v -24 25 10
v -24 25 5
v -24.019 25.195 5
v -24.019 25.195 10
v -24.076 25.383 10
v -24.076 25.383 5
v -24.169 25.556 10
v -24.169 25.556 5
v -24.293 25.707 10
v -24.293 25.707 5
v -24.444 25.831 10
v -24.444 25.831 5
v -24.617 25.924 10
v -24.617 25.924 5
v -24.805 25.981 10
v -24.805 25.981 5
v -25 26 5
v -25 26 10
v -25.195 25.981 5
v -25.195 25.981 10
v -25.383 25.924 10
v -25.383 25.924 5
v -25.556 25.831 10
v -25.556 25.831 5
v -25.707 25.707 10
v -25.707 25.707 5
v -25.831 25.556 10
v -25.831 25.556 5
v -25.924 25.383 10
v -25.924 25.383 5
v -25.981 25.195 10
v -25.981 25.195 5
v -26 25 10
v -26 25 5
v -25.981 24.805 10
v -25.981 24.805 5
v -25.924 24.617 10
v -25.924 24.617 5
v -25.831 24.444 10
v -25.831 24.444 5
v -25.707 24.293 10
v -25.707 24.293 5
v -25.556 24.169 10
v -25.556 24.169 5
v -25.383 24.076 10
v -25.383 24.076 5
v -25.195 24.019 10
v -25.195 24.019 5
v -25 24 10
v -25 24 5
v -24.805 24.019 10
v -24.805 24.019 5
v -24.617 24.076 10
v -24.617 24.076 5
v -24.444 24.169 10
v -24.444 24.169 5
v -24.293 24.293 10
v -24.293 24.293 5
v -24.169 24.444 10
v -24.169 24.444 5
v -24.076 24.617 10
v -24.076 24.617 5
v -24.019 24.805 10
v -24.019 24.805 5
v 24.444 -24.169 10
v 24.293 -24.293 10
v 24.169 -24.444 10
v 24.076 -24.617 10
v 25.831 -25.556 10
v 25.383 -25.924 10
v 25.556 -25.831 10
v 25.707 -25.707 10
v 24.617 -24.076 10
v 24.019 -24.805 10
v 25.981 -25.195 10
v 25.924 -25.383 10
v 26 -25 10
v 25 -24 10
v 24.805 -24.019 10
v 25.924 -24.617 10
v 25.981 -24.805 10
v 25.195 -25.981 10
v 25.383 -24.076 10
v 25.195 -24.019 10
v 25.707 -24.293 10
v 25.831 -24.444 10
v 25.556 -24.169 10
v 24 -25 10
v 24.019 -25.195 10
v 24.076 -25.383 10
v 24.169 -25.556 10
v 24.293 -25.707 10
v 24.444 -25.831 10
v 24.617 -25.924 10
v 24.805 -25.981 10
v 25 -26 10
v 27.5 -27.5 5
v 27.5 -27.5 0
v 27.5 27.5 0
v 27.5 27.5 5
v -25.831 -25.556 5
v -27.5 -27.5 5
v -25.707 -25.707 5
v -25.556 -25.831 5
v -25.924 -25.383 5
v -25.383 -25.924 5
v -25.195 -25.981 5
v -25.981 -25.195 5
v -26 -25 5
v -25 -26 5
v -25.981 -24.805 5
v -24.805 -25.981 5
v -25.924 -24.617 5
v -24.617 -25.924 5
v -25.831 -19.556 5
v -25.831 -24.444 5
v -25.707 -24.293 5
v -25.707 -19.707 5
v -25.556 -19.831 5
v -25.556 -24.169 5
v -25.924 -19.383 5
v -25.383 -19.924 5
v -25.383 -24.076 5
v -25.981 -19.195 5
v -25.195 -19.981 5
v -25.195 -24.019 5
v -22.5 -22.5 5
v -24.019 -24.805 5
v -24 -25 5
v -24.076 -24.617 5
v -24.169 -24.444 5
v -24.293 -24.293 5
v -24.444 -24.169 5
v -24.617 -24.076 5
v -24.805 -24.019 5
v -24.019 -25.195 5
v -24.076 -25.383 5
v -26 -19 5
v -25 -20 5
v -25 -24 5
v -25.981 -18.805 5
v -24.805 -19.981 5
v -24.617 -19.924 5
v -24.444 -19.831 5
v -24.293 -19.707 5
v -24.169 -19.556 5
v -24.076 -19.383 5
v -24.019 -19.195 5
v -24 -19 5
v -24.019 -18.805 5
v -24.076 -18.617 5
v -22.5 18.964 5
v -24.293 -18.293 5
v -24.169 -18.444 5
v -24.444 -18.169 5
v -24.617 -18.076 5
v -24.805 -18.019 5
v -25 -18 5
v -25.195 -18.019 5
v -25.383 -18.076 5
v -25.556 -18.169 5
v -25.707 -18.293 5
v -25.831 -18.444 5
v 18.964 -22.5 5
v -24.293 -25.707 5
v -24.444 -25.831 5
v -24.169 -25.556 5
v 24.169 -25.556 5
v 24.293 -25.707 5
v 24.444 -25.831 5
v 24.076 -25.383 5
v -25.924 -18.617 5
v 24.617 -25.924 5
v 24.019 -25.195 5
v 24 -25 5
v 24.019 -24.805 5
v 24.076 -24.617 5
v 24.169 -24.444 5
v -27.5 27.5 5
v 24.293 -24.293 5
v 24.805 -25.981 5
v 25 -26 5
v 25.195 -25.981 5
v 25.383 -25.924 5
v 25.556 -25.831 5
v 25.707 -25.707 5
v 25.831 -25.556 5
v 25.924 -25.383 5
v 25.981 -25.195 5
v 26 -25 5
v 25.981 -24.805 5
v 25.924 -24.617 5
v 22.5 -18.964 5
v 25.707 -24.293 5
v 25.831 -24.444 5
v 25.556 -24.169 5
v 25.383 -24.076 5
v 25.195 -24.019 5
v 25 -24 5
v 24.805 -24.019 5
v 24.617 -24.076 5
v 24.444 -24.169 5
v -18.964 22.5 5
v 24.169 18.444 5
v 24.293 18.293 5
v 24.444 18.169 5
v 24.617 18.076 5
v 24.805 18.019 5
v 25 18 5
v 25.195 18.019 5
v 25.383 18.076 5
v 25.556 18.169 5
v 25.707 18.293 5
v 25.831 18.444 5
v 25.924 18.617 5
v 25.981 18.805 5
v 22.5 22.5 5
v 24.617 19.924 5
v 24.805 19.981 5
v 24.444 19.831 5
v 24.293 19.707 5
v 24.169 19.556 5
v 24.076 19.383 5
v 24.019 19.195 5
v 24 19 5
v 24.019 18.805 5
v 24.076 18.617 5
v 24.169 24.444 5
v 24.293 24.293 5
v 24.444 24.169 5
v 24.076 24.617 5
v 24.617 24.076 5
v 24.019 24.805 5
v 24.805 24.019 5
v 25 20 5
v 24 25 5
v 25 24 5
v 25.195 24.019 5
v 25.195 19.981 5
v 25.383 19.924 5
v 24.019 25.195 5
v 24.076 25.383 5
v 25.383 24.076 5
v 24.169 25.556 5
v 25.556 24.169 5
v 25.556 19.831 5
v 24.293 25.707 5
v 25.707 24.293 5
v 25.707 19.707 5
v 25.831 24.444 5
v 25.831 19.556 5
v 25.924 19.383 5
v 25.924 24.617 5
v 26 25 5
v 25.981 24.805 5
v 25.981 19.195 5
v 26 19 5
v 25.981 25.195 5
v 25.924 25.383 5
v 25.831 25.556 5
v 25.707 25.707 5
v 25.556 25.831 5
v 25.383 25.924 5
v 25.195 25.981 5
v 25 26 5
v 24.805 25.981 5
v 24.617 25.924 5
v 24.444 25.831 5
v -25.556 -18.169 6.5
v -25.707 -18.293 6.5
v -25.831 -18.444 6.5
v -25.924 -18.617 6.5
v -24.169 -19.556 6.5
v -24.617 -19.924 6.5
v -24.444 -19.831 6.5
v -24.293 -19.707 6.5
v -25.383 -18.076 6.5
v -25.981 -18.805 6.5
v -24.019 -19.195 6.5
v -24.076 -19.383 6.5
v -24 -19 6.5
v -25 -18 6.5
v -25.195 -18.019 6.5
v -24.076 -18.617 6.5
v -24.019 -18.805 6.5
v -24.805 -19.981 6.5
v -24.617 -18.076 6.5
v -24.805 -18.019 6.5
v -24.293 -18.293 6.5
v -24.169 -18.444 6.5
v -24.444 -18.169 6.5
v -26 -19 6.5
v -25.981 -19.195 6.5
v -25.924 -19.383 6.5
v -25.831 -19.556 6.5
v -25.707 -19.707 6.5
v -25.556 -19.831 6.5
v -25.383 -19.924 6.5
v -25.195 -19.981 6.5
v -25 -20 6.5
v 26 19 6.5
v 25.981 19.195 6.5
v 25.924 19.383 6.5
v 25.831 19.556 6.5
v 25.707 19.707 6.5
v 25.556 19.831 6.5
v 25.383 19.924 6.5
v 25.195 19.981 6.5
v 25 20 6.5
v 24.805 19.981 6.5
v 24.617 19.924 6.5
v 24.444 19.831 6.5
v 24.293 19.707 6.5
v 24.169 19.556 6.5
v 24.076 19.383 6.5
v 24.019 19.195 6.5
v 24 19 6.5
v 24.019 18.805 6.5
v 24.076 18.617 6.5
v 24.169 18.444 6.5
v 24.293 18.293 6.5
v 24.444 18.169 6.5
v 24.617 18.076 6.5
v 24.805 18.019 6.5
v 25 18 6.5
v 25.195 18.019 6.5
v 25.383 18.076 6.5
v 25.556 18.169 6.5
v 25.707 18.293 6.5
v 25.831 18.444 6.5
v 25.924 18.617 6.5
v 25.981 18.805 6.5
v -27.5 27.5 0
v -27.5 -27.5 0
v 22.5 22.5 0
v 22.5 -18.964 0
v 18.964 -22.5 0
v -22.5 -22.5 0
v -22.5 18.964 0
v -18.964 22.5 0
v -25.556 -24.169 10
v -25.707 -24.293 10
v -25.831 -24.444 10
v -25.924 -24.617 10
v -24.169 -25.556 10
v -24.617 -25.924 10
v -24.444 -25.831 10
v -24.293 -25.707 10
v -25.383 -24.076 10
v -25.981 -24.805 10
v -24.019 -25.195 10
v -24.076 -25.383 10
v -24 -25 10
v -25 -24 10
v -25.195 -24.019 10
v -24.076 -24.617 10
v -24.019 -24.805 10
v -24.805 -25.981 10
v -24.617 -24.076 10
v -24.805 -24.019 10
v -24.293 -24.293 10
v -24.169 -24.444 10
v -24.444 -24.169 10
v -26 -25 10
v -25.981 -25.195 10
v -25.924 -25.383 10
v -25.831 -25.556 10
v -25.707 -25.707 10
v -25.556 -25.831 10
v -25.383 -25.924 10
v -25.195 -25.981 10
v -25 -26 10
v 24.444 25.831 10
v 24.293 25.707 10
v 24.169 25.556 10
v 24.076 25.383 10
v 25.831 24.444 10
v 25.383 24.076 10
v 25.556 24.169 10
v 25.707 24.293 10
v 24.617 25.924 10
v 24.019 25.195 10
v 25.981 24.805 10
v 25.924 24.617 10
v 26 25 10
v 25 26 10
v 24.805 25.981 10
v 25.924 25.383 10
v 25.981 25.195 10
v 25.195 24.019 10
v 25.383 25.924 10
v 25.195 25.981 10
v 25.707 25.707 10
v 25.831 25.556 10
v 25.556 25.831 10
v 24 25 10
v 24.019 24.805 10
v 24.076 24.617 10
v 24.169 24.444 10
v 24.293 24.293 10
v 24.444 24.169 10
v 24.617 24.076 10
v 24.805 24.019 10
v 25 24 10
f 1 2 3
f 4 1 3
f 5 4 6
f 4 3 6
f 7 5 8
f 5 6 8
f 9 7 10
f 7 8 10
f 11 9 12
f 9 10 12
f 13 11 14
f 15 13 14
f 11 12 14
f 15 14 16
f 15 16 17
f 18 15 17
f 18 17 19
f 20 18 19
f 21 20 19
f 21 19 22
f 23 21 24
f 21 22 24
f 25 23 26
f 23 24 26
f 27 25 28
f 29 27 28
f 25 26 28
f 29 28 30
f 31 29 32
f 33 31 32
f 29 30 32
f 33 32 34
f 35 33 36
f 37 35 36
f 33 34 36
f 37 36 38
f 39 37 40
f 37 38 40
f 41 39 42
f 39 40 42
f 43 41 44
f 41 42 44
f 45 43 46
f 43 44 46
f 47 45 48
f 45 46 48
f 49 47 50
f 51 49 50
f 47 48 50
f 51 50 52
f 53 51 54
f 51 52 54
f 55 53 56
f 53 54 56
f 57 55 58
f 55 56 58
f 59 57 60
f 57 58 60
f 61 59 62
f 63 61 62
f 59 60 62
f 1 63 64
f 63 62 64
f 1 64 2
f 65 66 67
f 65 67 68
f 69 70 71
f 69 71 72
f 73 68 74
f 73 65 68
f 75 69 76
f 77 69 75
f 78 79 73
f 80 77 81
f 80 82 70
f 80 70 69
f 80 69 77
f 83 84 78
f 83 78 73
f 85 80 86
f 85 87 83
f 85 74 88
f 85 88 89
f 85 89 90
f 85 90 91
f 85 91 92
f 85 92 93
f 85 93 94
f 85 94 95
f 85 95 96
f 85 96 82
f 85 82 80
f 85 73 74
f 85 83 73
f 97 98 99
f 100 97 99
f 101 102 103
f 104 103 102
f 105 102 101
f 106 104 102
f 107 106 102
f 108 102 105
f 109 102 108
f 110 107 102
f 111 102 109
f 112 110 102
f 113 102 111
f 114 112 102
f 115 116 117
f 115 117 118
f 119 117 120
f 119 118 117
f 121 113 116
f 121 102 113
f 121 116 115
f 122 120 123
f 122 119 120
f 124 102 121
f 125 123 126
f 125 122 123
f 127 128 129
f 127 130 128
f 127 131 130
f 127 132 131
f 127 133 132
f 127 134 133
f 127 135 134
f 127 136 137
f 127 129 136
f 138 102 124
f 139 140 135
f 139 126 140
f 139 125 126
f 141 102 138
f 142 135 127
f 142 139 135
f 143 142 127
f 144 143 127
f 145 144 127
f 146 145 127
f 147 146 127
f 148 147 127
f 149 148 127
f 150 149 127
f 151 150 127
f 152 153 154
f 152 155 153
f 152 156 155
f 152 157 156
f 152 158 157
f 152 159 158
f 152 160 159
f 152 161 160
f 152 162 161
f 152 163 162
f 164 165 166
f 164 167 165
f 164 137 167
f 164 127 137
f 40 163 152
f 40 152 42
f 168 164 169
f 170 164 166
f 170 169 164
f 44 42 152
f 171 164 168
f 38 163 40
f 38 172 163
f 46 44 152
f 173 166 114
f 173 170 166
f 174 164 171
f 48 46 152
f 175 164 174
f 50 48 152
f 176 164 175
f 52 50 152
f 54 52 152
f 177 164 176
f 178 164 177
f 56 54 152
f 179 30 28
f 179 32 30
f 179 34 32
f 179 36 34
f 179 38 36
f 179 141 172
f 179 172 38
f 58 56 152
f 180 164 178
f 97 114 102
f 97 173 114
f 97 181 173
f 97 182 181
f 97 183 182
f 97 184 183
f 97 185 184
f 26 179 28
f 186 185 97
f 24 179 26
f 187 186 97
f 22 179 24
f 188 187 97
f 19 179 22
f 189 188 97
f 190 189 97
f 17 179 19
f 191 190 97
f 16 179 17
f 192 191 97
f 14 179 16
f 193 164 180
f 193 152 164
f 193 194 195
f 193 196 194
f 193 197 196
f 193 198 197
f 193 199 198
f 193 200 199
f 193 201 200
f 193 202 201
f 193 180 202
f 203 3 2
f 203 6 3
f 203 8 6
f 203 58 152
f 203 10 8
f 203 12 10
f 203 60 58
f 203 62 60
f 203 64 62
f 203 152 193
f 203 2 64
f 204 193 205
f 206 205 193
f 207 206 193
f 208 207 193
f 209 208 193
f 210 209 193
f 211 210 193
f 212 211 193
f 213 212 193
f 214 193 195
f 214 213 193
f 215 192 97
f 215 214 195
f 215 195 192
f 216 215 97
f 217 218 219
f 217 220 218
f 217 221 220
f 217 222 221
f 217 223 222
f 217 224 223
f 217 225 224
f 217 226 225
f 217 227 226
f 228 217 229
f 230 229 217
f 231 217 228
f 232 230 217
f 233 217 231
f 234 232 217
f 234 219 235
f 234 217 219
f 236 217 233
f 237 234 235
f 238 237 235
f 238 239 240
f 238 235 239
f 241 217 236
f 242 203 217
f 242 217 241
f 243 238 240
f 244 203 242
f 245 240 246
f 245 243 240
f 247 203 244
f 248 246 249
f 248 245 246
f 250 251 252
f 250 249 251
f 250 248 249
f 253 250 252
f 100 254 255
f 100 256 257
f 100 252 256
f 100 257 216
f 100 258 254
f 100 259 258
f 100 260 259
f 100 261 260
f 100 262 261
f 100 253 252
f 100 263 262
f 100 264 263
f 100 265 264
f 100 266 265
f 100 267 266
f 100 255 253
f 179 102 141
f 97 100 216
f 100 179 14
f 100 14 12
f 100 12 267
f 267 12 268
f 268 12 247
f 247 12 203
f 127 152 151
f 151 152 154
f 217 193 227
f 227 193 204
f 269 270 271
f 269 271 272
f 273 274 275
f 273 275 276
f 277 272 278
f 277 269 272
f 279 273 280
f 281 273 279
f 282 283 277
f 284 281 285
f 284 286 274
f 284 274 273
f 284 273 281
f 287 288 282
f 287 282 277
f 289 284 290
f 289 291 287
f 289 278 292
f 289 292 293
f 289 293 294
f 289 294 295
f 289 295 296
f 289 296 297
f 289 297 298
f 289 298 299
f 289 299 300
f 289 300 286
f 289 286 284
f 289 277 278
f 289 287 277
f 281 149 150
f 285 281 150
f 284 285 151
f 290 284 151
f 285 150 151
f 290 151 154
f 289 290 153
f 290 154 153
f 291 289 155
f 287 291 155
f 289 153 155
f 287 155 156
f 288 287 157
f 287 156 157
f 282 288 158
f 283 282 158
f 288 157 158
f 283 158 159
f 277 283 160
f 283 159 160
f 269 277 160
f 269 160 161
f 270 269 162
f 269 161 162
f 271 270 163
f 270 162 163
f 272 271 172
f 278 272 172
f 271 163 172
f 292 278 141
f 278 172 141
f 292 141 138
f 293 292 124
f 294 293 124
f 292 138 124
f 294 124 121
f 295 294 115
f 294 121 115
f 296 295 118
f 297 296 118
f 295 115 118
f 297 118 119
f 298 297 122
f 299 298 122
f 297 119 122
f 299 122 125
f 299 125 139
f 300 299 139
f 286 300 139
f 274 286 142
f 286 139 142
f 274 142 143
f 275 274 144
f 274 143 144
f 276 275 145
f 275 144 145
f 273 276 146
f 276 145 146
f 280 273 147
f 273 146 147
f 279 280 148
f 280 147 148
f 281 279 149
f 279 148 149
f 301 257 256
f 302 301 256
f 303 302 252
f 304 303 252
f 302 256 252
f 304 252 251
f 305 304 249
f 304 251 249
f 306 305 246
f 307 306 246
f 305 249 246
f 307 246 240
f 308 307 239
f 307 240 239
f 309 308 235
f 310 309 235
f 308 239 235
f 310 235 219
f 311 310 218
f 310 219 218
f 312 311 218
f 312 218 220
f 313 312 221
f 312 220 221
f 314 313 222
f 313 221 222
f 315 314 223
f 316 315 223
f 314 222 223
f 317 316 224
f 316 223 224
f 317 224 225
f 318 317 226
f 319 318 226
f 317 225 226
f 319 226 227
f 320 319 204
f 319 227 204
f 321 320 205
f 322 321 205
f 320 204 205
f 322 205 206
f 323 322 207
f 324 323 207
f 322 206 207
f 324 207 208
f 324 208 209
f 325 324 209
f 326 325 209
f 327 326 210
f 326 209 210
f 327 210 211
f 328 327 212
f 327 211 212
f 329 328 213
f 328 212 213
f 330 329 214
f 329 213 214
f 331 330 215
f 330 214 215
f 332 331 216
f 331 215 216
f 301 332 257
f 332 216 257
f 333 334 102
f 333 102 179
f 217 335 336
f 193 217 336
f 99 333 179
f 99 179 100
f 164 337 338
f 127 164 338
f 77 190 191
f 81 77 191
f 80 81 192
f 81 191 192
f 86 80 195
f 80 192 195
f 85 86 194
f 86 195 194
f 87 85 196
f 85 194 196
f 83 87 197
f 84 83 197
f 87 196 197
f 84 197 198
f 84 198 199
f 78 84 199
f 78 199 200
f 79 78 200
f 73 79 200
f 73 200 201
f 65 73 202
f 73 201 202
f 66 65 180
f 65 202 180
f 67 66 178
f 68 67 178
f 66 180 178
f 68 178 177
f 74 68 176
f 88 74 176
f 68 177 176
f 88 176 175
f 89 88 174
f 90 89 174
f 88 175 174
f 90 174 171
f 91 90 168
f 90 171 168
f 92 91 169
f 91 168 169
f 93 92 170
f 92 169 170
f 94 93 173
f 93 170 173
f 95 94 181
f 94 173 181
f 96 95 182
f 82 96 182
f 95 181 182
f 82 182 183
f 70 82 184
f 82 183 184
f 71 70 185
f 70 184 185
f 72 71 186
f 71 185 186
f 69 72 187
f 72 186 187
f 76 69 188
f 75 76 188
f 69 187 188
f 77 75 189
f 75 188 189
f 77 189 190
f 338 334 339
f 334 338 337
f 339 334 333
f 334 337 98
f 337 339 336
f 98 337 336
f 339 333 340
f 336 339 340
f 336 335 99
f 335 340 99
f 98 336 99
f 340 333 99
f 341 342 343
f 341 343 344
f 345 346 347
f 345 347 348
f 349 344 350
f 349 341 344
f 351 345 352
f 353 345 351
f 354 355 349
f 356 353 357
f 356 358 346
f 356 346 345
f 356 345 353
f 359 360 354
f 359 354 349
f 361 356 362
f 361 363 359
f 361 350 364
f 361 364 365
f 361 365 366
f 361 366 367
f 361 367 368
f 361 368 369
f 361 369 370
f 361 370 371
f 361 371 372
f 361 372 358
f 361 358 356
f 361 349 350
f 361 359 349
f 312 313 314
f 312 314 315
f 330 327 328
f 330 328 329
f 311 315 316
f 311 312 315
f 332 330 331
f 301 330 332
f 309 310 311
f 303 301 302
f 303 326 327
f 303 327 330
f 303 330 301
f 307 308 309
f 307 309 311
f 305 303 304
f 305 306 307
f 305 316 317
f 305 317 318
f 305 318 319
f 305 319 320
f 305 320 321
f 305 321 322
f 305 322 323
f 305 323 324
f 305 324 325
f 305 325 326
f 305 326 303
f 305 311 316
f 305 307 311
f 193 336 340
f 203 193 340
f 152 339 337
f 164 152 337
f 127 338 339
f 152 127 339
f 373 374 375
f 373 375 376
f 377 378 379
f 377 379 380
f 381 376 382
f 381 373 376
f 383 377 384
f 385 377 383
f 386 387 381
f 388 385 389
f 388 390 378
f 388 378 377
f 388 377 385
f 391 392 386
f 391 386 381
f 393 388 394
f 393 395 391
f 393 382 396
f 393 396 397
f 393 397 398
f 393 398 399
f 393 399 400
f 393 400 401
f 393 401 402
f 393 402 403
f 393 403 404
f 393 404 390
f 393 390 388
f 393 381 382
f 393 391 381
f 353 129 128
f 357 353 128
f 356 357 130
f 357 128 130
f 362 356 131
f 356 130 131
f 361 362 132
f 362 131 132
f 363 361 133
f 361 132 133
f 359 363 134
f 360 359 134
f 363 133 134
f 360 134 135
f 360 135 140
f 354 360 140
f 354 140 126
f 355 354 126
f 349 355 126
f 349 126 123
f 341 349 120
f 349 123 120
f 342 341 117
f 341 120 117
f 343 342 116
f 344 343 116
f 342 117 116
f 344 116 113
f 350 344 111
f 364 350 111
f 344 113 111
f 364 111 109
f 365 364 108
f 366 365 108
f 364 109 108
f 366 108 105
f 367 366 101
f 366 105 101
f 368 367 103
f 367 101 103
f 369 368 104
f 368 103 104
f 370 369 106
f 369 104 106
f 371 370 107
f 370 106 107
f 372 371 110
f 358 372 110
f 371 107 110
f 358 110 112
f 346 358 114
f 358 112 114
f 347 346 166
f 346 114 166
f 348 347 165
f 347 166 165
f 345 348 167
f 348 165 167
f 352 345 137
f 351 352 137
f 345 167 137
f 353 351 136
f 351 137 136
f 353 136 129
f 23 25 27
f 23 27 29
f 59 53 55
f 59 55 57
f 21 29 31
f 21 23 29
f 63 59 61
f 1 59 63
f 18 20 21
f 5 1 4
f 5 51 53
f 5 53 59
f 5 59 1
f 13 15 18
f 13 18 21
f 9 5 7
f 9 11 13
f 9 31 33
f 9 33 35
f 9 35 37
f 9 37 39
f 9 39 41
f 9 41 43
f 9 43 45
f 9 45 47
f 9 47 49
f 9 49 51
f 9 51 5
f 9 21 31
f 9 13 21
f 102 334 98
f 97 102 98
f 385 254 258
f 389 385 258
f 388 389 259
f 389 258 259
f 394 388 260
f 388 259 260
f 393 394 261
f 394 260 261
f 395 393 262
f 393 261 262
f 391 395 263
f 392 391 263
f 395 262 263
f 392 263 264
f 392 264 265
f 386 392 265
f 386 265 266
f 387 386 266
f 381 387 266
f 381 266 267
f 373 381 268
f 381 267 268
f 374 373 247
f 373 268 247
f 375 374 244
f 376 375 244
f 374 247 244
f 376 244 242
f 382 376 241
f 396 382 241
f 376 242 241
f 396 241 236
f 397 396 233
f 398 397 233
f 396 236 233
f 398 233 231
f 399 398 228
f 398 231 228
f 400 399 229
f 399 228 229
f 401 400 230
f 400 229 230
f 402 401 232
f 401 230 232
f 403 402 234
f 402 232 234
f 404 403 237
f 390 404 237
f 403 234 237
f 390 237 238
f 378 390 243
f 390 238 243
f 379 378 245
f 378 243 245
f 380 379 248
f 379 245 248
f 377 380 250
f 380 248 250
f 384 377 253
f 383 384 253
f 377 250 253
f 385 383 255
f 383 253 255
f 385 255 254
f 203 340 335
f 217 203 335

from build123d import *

# Parameters (mm, degrees)
F0_W     = 55
F0_H     = 55
F1_DEPTH = 5
F2_R     = 1
F3_DEPTH = 5
F4_R     = 1
F5_DEPTH = 1.5


with BuildPart() as f1:
    # F0 (on Top) → F1 (new body)
    with BuildSketch(Plane.XY):
        Rectangle(F0_W, F0_H)
        Polygon((18.964466, -22.5), (-22.5, -22.5), (-22.5, 18.964466), align=None, mode=Mode.SUBTRACT)
        Polygon((22.5, -18.964466), (-18.964466, 22.5), (22.5, 22.5), align=None, mode=Mode.SUBTRACT)
    extrude(amount=F1_DEPTH)

    # F2 (on face) → F3 (join)
    with BuildSketch(Plane.XY.offset(5)):
        with Locations((-25, 25)):
            Circle(F2_R)
        with Locations((25, -25)):
            Circle(F2_R)
        with Locations((25, 25)):
            Circle(F2_R)
        with Locations((-25, -25)):
            Circle(F2_R)
    extrude(amount=F3_DEPTH)

    # F4 (on face) → F5 (join)
    with BuildSketch(Plane.XY.offset(5)):
        with Locations((-25, -19)):
            Circle(F4_R)
        with Locations((25, 19)):
            Circle(F4_R)
    extrude(amount=F5_DEPTH)


solid = f1.part
